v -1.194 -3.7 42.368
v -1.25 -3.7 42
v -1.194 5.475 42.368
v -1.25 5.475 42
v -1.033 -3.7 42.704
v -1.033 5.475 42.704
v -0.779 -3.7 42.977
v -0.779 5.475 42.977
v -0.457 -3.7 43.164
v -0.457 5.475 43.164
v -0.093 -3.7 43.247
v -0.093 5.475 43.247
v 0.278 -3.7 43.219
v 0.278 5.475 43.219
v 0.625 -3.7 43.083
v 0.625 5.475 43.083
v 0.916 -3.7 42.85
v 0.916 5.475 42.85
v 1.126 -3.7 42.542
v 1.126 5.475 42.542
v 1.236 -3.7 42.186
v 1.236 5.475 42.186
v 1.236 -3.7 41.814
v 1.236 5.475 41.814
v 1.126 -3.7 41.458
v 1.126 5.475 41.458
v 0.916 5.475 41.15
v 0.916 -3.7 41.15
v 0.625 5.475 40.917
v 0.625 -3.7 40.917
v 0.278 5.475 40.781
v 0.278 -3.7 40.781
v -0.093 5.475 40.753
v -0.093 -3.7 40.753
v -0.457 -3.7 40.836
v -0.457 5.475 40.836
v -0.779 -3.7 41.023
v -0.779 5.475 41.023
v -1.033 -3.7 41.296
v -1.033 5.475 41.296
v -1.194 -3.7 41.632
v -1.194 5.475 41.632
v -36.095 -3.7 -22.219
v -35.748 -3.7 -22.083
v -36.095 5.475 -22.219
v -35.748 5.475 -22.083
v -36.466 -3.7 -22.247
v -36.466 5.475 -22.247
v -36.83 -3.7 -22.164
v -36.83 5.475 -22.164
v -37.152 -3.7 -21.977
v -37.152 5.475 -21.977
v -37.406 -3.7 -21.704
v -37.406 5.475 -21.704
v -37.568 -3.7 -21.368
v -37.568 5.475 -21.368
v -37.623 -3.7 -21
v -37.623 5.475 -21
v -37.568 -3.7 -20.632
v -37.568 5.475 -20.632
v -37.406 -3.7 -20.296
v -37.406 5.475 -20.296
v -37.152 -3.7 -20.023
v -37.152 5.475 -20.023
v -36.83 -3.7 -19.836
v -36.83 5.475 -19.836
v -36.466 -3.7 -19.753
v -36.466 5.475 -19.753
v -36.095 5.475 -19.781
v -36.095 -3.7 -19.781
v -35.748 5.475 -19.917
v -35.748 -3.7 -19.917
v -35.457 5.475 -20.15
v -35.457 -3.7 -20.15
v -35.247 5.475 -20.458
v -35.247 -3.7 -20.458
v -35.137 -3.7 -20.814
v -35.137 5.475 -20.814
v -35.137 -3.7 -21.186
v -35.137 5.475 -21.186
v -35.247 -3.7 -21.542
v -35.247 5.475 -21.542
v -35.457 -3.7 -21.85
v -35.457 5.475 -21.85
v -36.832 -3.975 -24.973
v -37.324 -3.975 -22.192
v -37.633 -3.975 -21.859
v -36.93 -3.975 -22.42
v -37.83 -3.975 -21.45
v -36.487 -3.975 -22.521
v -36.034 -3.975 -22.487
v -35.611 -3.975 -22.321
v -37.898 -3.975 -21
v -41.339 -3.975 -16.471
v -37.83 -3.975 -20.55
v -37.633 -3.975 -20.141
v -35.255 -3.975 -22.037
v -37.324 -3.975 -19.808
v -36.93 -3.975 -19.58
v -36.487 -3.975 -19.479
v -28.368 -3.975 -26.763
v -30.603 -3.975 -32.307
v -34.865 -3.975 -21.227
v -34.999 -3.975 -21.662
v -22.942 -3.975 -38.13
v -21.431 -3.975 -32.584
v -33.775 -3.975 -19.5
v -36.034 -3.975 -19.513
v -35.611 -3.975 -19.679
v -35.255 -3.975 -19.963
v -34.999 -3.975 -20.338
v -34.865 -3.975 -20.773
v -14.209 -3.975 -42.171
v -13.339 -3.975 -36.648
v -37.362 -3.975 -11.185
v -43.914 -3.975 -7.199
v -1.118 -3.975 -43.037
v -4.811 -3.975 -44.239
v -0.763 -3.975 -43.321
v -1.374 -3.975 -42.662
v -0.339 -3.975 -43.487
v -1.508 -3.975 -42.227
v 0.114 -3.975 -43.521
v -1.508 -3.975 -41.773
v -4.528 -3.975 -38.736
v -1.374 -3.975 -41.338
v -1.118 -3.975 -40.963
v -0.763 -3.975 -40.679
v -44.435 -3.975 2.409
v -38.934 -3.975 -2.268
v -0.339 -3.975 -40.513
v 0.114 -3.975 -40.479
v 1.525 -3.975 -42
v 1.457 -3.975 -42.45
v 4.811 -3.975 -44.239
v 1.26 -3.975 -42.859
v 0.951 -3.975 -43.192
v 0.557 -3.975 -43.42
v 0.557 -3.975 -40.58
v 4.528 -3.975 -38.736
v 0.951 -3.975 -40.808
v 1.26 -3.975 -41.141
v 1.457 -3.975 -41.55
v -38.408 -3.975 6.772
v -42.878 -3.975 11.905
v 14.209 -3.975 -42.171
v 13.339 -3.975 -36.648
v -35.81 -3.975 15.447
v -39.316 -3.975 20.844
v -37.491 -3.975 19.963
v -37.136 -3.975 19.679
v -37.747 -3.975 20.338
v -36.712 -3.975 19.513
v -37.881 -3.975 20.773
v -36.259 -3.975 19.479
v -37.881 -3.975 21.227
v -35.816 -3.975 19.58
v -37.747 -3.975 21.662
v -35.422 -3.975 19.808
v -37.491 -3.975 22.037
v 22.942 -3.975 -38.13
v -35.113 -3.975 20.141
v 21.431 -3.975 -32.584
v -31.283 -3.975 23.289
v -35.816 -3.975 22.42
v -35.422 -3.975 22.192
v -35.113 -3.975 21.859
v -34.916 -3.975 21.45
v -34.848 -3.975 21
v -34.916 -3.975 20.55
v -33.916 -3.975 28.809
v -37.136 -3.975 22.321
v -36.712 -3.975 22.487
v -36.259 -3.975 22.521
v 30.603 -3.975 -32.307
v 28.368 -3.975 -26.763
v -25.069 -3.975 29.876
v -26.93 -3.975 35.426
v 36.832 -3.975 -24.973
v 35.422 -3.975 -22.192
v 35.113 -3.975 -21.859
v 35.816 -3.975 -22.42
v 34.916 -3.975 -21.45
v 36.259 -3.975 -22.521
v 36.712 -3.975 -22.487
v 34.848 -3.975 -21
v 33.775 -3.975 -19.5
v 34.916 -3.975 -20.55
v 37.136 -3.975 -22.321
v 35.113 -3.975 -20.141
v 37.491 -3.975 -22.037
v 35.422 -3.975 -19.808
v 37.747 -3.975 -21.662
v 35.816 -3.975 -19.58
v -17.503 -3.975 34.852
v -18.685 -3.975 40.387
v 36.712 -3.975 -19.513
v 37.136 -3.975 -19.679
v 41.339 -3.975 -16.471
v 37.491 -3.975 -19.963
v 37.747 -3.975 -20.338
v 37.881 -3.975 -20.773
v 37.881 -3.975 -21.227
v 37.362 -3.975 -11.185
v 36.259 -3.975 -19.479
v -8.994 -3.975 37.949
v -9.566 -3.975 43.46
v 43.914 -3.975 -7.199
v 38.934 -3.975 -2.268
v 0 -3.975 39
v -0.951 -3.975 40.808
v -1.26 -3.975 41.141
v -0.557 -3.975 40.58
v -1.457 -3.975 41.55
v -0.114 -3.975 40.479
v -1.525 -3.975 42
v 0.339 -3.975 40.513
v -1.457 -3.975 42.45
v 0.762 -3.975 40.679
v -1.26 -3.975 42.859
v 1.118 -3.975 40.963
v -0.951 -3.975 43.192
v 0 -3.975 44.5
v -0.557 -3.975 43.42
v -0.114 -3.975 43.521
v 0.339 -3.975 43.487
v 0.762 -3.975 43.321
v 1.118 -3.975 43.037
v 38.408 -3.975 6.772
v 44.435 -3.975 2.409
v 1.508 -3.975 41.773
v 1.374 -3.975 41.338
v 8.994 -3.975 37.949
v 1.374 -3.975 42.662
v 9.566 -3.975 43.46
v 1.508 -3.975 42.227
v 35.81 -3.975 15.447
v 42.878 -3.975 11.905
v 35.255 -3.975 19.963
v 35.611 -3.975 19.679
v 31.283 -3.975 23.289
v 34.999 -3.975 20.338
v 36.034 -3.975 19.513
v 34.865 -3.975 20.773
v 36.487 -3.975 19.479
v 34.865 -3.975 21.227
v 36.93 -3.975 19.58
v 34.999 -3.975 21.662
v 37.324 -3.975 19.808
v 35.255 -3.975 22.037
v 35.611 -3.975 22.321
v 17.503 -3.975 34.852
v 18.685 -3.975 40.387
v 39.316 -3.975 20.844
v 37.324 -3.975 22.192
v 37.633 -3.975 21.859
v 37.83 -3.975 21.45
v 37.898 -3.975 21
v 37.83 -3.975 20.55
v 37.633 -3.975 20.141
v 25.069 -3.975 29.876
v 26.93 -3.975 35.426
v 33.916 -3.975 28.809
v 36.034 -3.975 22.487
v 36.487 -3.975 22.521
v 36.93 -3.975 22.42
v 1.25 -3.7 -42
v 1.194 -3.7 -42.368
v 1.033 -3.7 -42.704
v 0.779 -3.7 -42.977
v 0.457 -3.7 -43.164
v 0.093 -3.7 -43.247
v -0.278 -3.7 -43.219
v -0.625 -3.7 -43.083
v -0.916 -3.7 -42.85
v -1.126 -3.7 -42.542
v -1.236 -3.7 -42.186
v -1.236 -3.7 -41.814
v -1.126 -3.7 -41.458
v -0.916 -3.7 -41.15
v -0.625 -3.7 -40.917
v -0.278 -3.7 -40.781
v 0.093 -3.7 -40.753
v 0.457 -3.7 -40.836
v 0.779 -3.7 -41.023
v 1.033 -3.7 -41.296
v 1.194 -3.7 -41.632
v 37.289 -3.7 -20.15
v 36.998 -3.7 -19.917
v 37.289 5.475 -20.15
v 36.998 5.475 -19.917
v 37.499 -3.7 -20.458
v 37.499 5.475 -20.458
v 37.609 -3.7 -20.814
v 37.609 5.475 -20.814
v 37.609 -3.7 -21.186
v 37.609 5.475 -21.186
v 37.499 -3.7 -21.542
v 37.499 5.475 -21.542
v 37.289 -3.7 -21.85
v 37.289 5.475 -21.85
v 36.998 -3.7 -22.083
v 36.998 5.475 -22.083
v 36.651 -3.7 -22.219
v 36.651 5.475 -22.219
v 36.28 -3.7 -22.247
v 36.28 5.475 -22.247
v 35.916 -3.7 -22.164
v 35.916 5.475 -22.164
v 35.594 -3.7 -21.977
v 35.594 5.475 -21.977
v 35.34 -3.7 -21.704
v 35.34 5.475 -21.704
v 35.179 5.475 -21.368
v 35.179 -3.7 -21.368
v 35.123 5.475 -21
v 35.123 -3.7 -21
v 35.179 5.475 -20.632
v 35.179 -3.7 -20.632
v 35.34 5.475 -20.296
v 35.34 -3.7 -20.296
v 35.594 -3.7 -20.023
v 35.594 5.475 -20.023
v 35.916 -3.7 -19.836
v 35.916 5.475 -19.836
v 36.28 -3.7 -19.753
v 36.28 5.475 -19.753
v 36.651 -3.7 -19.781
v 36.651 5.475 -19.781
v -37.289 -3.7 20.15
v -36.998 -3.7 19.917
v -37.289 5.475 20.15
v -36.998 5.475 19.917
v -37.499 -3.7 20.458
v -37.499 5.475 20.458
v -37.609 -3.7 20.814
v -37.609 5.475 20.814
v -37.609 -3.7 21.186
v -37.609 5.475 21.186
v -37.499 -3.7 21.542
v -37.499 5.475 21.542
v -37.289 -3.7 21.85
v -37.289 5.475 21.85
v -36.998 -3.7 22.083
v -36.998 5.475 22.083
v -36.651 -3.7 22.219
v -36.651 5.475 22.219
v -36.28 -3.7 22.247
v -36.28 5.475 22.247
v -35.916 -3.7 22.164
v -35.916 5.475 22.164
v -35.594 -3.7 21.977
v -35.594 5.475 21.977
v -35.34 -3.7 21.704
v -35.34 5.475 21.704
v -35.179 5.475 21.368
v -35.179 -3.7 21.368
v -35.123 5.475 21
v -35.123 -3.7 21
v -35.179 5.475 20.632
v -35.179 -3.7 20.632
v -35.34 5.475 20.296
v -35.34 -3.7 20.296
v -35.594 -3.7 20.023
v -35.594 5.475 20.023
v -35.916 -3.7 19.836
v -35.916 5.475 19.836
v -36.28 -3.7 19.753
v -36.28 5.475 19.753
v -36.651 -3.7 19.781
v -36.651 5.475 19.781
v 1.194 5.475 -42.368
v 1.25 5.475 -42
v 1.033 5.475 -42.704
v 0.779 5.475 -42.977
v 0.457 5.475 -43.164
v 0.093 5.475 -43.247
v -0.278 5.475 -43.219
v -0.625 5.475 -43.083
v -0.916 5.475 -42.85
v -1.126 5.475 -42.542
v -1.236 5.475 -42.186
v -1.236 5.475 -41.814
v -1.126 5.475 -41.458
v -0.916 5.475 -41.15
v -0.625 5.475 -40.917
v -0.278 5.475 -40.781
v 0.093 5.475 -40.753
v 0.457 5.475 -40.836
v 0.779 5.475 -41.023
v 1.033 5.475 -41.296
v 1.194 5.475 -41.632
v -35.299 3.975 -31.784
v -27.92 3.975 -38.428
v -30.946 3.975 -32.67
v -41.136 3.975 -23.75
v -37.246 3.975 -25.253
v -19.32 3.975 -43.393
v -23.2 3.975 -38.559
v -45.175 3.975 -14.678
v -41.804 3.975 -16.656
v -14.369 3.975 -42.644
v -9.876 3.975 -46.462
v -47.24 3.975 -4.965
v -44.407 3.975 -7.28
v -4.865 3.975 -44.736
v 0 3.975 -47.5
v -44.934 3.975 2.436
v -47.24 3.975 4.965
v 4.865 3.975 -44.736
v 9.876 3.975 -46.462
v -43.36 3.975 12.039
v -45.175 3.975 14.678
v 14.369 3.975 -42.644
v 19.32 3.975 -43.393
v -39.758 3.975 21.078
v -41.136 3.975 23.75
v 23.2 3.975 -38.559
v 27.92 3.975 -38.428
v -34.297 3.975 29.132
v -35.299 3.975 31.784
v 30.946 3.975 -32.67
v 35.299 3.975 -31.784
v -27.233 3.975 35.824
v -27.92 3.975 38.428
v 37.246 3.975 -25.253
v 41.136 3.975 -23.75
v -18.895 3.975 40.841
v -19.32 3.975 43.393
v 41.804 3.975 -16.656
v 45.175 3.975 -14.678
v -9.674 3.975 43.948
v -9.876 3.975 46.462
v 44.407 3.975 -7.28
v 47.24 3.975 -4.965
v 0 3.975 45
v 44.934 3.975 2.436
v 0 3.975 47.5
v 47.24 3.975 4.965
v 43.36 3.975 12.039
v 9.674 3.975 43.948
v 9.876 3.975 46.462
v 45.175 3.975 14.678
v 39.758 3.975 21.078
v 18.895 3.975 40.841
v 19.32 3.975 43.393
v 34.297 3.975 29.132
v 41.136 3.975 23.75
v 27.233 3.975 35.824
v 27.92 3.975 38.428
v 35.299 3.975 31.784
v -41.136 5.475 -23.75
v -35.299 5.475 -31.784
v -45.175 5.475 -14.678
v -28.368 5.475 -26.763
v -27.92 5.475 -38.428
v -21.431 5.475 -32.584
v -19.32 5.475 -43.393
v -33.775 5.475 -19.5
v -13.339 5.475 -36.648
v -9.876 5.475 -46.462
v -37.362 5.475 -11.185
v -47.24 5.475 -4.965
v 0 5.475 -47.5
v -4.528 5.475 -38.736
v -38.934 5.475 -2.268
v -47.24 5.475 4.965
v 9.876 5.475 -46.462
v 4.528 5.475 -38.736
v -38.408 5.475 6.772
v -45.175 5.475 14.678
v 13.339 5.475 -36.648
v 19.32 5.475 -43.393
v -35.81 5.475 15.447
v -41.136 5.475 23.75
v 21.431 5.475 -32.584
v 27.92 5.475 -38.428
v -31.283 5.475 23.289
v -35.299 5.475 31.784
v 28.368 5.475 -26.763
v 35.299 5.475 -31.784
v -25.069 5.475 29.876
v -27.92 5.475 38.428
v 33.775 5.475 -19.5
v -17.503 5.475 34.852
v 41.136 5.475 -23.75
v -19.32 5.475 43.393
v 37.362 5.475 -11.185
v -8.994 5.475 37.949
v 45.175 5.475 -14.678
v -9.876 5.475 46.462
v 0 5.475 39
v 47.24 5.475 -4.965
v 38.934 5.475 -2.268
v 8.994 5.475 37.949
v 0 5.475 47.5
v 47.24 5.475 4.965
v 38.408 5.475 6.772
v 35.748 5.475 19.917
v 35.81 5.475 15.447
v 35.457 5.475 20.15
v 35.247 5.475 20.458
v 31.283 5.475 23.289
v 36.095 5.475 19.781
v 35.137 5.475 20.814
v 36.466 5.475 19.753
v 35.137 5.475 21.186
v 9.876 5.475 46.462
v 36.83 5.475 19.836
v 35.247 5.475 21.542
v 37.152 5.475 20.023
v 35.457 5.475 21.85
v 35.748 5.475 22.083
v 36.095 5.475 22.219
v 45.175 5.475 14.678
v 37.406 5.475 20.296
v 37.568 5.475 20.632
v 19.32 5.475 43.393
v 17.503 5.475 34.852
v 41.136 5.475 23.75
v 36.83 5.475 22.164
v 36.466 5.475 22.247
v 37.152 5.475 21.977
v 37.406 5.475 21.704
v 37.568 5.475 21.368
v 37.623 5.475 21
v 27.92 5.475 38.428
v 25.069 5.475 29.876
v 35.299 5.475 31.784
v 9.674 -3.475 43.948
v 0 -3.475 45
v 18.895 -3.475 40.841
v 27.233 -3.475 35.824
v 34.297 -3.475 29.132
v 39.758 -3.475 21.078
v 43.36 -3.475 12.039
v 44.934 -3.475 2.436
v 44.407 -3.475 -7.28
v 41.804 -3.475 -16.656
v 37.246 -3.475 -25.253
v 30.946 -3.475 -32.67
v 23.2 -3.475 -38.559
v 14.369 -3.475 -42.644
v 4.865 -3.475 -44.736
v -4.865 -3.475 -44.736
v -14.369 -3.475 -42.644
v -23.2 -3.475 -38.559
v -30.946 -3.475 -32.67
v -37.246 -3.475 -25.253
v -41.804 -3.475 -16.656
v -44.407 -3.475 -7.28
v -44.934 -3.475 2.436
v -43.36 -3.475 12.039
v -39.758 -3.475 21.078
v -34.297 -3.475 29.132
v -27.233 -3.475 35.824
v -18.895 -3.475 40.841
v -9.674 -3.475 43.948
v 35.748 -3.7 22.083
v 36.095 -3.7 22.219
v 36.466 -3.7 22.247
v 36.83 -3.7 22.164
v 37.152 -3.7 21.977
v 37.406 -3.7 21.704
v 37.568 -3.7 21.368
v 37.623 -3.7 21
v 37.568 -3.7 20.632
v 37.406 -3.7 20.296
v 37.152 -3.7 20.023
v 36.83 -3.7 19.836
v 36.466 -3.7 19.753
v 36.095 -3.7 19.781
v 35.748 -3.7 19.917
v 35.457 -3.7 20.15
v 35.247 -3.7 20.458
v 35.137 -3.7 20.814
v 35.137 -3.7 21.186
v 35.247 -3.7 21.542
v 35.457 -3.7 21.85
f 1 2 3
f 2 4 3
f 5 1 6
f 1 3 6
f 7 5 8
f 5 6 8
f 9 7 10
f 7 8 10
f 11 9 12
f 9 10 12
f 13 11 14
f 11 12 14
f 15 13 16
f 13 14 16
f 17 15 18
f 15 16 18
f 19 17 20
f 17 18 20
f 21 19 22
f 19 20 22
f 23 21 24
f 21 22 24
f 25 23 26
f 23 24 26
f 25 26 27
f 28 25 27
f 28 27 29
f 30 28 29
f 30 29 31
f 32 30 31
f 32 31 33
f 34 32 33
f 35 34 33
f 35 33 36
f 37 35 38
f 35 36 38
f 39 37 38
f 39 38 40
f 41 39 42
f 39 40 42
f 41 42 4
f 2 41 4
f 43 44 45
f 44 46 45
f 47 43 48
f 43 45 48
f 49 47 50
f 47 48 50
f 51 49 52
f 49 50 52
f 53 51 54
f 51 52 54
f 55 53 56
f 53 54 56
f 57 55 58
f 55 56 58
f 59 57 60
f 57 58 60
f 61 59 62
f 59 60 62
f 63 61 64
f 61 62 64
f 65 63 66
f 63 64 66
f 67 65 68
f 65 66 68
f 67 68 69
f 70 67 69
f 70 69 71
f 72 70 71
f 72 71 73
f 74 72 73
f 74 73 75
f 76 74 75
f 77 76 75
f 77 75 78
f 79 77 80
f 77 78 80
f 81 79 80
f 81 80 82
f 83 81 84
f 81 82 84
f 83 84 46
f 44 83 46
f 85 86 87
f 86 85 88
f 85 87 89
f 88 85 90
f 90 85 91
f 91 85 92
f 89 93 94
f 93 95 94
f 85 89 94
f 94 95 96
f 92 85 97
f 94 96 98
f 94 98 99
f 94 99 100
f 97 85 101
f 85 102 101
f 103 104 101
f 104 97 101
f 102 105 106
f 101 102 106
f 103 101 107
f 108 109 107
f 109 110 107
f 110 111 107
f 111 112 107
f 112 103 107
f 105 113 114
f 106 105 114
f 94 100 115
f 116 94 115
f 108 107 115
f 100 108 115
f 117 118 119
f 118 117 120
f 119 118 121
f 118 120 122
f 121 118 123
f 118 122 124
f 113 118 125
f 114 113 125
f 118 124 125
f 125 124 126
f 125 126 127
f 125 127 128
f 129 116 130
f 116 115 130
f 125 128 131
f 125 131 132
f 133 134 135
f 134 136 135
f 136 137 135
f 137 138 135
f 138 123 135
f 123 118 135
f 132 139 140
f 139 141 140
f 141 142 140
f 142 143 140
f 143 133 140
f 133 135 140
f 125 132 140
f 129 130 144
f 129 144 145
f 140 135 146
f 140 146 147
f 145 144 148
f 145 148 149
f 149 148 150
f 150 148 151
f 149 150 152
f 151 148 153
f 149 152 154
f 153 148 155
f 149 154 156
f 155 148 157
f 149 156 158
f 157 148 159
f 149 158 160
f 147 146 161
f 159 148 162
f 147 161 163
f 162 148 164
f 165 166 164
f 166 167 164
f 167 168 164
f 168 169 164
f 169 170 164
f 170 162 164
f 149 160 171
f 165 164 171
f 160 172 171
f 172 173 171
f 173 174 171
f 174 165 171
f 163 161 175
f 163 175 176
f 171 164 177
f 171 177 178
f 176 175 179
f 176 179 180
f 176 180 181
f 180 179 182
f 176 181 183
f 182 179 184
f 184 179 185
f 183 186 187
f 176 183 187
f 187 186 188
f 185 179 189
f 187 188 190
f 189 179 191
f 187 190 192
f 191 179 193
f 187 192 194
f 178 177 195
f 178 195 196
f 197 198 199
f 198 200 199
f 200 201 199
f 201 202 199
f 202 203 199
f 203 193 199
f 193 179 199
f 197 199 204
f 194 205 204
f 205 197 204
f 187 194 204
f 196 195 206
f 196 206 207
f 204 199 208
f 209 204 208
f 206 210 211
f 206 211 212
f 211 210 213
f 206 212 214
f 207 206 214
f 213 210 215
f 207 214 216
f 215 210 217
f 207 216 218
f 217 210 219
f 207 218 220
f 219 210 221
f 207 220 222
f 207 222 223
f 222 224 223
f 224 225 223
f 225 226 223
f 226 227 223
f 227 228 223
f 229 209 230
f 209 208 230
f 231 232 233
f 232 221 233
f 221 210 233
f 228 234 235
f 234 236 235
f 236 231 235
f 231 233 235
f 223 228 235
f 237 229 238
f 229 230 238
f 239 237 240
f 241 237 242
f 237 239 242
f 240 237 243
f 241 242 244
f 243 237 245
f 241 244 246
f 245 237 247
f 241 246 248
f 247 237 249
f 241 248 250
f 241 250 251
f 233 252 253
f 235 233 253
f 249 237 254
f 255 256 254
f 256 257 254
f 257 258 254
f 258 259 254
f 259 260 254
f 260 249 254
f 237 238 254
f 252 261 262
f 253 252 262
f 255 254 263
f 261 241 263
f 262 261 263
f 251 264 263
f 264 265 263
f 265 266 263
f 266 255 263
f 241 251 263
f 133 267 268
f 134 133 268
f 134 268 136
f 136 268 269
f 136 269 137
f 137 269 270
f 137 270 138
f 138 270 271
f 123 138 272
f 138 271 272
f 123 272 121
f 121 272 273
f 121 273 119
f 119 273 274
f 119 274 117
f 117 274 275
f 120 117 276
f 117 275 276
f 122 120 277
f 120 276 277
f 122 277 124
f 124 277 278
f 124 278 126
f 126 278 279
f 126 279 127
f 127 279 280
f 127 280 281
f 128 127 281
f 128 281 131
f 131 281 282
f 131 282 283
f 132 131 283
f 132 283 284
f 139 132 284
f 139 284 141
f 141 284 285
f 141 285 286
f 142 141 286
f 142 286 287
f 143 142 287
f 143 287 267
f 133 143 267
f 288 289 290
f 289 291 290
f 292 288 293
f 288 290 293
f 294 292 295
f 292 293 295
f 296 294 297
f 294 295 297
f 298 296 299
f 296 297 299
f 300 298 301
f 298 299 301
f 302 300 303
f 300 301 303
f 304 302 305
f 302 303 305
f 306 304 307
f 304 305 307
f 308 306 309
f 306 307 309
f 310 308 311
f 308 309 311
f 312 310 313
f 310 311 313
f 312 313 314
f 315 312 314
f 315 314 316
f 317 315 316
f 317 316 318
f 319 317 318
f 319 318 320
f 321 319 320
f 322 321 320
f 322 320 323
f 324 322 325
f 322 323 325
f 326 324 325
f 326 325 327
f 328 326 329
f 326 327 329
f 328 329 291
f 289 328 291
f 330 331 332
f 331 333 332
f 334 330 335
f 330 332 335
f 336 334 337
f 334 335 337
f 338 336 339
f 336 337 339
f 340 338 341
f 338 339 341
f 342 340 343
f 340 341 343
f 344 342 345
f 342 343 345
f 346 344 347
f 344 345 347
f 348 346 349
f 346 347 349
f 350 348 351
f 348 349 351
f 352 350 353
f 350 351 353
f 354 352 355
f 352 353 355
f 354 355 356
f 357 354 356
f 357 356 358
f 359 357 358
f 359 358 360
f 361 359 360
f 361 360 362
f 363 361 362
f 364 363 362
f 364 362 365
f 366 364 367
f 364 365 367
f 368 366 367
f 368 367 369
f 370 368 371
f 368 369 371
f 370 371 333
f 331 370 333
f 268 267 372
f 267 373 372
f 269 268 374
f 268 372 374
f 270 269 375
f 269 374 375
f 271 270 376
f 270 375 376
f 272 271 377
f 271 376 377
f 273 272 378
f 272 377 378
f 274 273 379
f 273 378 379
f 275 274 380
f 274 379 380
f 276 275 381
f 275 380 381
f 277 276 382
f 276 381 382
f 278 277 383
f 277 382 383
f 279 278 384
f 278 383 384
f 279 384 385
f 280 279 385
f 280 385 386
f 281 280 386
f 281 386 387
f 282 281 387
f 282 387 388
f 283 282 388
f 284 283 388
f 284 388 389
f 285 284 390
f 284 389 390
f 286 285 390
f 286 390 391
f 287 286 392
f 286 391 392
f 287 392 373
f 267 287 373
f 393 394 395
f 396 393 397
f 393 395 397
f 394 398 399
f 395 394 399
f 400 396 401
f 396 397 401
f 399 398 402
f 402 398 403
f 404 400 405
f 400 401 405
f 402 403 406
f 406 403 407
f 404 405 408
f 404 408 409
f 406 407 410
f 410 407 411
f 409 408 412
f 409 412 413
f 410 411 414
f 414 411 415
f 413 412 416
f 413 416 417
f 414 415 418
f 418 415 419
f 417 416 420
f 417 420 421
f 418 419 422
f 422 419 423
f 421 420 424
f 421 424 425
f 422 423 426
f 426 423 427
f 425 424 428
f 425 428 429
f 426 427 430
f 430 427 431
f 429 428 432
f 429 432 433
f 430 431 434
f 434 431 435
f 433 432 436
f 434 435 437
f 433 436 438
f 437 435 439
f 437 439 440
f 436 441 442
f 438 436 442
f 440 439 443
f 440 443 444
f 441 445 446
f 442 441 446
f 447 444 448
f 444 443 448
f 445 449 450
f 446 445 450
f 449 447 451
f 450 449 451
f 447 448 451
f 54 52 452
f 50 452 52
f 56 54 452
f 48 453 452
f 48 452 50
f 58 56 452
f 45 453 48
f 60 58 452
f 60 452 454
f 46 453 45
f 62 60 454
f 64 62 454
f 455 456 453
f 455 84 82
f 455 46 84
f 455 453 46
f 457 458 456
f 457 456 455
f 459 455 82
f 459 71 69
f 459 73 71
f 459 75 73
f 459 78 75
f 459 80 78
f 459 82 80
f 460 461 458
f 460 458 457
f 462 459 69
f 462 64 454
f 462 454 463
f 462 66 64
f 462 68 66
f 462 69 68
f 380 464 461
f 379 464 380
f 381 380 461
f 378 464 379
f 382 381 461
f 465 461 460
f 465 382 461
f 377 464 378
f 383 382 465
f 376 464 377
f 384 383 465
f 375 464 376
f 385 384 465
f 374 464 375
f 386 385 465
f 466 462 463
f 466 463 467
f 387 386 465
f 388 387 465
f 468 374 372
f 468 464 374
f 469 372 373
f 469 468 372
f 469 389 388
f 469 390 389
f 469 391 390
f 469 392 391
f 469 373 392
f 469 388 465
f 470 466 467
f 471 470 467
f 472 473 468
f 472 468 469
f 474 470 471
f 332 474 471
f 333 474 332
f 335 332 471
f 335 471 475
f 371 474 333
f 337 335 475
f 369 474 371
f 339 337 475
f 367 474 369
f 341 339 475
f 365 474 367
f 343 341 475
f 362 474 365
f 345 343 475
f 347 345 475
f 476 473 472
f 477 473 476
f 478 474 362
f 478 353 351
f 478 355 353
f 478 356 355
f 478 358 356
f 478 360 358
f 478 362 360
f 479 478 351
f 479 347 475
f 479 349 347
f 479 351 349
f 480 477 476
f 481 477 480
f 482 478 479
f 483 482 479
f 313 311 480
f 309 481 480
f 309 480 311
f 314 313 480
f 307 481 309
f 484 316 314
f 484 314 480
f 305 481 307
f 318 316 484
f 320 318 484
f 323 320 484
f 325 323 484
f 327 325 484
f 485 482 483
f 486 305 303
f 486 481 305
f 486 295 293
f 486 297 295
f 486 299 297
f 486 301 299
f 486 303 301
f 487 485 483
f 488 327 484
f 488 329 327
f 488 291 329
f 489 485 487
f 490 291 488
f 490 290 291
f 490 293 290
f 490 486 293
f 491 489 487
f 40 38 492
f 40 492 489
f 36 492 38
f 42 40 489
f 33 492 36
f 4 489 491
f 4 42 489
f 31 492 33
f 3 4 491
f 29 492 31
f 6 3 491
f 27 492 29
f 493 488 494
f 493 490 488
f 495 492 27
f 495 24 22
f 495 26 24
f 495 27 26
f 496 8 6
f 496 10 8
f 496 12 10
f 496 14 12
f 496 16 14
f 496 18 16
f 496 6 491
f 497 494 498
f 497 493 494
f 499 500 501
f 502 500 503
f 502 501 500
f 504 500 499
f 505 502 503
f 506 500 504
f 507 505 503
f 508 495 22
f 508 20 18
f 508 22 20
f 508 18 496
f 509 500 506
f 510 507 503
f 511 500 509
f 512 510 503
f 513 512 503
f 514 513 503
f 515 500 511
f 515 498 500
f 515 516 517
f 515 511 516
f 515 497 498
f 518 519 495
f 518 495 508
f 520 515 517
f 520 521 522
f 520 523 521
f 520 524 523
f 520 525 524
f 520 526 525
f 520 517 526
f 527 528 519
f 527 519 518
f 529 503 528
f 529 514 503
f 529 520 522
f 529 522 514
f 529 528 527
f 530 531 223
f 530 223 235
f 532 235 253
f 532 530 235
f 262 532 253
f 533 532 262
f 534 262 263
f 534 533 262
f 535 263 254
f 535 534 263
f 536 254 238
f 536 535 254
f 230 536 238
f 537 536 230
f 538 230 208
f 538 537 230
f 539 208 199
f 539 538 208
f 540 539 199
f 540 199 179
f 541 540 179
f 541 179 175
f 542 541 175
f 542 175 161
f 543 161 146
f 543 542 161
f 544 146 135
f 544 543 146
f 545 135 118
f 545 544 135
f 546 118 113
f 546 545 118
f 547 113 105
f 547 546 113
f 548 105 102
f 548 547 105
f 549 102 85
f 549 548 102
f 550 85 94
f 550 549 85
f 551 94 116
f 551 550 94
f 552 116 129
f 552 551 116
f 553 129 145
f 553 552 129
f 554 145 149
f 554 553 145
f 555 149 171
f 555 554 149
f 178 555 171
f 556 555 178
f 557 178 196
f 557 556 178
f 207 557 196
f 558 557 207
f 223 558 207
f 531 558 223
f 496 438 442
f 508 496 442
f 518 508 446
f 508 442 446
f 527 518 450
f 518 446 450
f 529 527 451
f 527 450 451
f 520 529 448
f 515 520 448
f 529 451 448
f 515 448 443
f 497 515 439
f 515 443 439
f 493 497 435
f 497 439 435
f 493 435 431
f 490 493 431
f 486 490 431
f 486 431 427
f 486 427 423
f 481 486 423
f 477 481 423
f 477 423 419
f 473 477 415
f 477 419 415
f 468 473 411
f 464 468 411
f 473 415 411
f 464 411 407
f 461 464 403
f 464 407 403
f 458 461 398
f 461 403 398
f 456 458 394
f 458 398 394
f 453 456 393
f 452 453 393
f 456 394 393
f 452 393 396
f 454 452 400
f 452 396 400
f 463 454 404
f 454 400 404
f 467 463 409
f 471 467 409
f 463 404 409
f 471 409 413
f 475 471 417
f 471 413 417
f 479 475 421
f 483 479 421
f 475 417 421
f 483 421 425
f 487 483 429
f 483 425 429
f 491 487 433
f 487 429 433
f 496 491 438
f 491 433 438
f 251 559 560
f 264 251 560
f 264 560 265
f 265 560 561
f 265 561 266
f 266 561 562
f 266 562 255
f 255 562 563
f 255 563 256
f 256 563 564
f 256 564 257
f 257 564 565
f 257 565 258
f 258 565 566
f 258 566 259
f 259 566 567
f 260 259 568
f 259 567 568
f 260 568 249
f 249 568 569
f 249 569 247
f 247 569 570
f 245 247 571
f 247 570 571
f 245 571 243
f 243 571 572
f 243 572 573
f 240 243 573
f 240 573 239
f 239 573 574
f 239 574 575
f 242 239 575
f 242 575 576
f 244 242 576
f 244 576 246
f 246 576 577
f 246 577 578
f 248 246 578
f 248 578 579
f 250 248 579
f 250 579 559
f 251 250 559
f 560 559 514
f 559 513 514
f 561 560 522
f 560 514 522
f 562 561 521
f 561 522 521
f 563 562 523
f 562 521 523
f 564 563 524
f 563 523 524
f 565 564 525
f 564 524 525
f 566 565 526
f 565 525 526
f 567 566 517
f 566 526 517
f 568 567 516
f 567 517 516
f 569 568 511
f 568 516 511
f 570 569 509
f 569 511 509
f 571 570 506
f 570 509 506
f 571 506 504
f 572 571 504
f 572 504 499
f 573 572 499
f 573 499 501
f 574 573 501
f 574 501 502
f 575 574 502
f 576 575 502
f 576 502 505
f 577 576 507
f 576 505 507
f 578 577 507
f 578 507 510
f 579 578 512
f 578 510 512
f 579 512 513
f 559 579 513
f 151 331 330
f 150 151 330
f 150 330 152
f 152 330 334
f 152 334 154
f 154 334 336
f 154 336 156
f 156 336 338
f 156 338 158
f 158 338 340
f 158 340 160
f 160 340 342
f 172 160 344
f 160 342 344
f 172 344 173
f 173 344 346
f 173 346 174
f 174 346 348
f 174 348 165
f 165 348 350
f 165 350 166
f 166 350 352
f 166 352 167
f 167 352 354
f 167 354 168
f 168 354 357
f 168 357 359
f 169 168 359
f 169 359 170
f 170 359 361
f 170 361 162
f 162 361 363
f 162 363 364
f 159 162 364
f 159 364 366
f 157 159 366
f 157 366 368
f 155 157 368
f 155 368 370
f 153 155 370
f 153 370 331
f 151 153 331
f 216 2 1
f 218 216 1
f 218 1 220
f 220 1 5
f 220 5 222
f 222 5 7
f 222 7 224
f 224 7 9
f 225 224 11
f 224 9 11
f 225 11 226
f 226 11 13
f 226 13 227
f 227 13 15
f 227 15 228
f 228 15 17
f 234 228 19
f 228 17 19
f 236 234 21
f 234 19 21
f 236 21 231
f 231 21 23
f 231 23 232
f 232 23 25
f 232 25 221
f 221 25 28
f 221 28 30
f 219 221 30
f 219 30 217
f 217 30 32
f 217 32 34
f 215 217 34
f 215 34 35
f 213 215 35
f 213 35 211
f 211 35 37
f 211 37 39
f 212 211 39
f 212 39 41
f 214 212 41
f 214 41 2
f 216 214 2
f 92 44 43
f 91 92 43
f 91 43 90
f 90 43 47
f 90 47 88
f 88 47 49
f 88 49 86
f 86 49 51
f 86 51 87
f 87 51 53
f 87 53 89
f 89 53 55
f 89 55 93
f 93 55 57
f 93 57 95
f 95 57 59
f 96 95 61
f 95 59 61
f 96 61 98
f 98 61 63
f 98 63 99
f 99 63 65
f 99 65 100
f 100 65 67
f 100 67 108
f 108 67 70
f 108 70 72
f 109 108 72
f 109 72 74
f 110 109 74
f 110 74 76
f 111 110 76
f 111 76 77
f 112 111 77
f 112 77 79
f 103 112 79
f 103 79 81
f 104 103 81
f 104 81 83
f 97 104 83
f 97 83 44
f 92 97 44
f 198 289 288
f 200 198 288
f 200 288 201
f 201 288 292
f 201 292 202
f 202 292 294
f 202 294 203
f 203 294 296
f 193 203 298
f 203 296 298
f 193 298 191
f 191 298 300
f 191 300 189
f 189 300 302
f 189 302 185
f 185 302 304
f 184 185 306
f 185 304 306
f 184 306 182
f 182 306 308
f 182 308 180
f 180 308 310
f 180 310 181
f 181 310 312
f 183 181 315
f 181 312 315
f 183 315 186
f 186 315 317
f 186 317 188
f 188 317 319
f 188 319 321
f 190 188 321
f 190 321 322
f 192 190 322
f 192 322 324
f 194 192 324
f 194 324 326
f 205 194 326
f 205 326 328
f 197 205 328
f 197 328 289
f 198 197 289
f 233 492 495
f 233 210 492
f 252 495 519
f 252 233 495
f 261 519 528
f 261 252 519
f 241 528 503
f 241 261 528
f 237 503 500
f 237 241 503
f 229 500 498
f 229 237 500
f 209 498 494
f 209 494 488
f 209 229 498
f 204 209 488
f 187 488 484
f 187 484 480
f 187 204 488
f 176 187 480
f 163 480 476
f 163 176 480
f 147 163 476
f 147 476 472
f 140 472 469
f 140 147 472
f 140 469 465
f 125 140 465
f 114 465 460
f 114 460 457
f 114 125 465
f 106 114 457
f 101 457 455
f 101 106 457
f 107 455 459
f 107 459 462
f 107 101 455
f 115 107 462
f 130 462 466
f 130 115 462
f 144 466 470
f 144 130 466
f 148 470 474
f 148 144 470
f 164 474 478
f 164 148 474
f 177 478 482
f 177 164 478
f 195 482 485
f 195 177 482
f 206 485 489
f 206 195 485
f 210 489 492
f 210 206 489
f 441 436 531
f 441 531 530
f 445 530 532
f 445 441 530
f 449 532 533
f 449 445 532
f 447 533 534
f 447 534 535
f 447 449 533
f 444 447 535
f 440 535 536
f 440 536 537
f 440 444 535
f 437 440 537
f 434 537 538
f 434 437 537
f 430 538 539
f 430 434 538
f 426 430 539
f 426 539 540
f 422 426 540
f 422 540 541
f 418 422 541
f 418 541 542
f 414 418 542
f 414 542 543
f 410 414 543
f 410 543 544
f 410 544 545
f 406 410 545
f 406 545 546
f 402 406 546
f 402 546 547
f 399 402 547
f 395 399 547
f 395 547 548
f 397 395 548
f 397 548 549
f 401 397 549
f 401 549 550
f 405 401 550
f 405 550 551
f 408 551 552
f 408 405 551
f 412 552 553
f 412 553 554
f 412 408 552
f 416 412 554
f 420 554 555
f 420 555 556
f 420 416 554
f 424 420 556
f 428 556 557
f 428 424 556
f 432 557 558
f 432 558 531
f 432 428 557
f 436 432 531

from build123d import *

# Parameters (mm, degrees)
SKETCH_1_R                   = 45
SKETCH_1_R_2                 = 39
EXTRUDE_1_DEPTH              = 3.975
SKETCH_2_R                   = 47.5
SKETCH_2_R_2                 = 39
EXTRUDE_2_DEPTH              = 1.5
HOLE_WIZARD_M3_1_D           = 2.5
HOLE_WIZARD_M3_1_CSINK_D     = 3.05
HOLE_WIZARD_M3_1_CSINK_ANGLE = 90
PATTERN_CIRCULAR_1_COUNT     = 6
CHAMFER_1_SIZE               = 0.5


with BuildPart() as part:
    # 草图1 → 凸台-拉伸1 (new, symmetric)
    with BuildSketch(Plane(origin=(0, 0, 0), x_dir=(1, 0, 0), z_dir=(0, 1, 0))):
        with Locations(Location((0, 0, 0), (0, 0, 270))):
            Circle(SKETCH_1_R)
        with Locations(Location((0, 0, 0), (0, 0, 270))):
            Circle(SKETCH_1_R_2, mode=Mode.SUBTRACT)
    extrude(amount=EXTRUDE_1_DEPTH, both=True)

    # 草图2 → 凸台-拉伸2 (add)
    with BuildSketch(Plane(origin=(0, 3.975, 0), x_dir=(1, 0, 0), z_dir=(0, 1, 0))):
        with Locations(Location((0, 0, 0), (0, 0, 270))):
            Circle(SKETCH_2_R)
        with Locations(Location((0, 0, 0), (0, 0, 270))):
            Circle(SKETCH_2_R_2, mode=Mode.SUBTRACT)
    extrude(amount=EXTRUDE_2_DEPTH)

    # M3 螺纹孔1 (through all)
    with Locations(Plane(origin=(0, -3.975, 0), x_dir=(-1, 0, 0), z_dir=(0, -1, 0))):
        with Locations((0, 42)):
            hole_wizard_m3_1 = CounterSinkHole(HOLE_WIZARD_M3_1_D / 2, HOLE_WIZARD_M3_1_CSINK_D / 2, counter_sink_angle=HOLE_WIZARD_M3_1_CSINK_ANGLE)

    # 阵列(圆周)1: M3 螺纹孔1 ×6 about axis
    pattern_circular_1_axis = Axis((0, 0, 0), (0, 1, 0))
    for i in range(1, PATTERN_CIRCULAR_1_COUNT):
        add(hole_wizard_m3_1.rotate(pattern_circular_1_axis, i * 360 / PATTERN_CIRCULAR_1_COUNT), mode=Mode.SUBTRACT)

    # 倒角1
    chamfer_1_edges = [part.edges().sort_by_distance(p)[0] for p in [
        (0, -3.975, -45),
    ]]
    chamfer(chamfer_1_edges, length=CHAMFER_1_SIZE)


solid = part.part
